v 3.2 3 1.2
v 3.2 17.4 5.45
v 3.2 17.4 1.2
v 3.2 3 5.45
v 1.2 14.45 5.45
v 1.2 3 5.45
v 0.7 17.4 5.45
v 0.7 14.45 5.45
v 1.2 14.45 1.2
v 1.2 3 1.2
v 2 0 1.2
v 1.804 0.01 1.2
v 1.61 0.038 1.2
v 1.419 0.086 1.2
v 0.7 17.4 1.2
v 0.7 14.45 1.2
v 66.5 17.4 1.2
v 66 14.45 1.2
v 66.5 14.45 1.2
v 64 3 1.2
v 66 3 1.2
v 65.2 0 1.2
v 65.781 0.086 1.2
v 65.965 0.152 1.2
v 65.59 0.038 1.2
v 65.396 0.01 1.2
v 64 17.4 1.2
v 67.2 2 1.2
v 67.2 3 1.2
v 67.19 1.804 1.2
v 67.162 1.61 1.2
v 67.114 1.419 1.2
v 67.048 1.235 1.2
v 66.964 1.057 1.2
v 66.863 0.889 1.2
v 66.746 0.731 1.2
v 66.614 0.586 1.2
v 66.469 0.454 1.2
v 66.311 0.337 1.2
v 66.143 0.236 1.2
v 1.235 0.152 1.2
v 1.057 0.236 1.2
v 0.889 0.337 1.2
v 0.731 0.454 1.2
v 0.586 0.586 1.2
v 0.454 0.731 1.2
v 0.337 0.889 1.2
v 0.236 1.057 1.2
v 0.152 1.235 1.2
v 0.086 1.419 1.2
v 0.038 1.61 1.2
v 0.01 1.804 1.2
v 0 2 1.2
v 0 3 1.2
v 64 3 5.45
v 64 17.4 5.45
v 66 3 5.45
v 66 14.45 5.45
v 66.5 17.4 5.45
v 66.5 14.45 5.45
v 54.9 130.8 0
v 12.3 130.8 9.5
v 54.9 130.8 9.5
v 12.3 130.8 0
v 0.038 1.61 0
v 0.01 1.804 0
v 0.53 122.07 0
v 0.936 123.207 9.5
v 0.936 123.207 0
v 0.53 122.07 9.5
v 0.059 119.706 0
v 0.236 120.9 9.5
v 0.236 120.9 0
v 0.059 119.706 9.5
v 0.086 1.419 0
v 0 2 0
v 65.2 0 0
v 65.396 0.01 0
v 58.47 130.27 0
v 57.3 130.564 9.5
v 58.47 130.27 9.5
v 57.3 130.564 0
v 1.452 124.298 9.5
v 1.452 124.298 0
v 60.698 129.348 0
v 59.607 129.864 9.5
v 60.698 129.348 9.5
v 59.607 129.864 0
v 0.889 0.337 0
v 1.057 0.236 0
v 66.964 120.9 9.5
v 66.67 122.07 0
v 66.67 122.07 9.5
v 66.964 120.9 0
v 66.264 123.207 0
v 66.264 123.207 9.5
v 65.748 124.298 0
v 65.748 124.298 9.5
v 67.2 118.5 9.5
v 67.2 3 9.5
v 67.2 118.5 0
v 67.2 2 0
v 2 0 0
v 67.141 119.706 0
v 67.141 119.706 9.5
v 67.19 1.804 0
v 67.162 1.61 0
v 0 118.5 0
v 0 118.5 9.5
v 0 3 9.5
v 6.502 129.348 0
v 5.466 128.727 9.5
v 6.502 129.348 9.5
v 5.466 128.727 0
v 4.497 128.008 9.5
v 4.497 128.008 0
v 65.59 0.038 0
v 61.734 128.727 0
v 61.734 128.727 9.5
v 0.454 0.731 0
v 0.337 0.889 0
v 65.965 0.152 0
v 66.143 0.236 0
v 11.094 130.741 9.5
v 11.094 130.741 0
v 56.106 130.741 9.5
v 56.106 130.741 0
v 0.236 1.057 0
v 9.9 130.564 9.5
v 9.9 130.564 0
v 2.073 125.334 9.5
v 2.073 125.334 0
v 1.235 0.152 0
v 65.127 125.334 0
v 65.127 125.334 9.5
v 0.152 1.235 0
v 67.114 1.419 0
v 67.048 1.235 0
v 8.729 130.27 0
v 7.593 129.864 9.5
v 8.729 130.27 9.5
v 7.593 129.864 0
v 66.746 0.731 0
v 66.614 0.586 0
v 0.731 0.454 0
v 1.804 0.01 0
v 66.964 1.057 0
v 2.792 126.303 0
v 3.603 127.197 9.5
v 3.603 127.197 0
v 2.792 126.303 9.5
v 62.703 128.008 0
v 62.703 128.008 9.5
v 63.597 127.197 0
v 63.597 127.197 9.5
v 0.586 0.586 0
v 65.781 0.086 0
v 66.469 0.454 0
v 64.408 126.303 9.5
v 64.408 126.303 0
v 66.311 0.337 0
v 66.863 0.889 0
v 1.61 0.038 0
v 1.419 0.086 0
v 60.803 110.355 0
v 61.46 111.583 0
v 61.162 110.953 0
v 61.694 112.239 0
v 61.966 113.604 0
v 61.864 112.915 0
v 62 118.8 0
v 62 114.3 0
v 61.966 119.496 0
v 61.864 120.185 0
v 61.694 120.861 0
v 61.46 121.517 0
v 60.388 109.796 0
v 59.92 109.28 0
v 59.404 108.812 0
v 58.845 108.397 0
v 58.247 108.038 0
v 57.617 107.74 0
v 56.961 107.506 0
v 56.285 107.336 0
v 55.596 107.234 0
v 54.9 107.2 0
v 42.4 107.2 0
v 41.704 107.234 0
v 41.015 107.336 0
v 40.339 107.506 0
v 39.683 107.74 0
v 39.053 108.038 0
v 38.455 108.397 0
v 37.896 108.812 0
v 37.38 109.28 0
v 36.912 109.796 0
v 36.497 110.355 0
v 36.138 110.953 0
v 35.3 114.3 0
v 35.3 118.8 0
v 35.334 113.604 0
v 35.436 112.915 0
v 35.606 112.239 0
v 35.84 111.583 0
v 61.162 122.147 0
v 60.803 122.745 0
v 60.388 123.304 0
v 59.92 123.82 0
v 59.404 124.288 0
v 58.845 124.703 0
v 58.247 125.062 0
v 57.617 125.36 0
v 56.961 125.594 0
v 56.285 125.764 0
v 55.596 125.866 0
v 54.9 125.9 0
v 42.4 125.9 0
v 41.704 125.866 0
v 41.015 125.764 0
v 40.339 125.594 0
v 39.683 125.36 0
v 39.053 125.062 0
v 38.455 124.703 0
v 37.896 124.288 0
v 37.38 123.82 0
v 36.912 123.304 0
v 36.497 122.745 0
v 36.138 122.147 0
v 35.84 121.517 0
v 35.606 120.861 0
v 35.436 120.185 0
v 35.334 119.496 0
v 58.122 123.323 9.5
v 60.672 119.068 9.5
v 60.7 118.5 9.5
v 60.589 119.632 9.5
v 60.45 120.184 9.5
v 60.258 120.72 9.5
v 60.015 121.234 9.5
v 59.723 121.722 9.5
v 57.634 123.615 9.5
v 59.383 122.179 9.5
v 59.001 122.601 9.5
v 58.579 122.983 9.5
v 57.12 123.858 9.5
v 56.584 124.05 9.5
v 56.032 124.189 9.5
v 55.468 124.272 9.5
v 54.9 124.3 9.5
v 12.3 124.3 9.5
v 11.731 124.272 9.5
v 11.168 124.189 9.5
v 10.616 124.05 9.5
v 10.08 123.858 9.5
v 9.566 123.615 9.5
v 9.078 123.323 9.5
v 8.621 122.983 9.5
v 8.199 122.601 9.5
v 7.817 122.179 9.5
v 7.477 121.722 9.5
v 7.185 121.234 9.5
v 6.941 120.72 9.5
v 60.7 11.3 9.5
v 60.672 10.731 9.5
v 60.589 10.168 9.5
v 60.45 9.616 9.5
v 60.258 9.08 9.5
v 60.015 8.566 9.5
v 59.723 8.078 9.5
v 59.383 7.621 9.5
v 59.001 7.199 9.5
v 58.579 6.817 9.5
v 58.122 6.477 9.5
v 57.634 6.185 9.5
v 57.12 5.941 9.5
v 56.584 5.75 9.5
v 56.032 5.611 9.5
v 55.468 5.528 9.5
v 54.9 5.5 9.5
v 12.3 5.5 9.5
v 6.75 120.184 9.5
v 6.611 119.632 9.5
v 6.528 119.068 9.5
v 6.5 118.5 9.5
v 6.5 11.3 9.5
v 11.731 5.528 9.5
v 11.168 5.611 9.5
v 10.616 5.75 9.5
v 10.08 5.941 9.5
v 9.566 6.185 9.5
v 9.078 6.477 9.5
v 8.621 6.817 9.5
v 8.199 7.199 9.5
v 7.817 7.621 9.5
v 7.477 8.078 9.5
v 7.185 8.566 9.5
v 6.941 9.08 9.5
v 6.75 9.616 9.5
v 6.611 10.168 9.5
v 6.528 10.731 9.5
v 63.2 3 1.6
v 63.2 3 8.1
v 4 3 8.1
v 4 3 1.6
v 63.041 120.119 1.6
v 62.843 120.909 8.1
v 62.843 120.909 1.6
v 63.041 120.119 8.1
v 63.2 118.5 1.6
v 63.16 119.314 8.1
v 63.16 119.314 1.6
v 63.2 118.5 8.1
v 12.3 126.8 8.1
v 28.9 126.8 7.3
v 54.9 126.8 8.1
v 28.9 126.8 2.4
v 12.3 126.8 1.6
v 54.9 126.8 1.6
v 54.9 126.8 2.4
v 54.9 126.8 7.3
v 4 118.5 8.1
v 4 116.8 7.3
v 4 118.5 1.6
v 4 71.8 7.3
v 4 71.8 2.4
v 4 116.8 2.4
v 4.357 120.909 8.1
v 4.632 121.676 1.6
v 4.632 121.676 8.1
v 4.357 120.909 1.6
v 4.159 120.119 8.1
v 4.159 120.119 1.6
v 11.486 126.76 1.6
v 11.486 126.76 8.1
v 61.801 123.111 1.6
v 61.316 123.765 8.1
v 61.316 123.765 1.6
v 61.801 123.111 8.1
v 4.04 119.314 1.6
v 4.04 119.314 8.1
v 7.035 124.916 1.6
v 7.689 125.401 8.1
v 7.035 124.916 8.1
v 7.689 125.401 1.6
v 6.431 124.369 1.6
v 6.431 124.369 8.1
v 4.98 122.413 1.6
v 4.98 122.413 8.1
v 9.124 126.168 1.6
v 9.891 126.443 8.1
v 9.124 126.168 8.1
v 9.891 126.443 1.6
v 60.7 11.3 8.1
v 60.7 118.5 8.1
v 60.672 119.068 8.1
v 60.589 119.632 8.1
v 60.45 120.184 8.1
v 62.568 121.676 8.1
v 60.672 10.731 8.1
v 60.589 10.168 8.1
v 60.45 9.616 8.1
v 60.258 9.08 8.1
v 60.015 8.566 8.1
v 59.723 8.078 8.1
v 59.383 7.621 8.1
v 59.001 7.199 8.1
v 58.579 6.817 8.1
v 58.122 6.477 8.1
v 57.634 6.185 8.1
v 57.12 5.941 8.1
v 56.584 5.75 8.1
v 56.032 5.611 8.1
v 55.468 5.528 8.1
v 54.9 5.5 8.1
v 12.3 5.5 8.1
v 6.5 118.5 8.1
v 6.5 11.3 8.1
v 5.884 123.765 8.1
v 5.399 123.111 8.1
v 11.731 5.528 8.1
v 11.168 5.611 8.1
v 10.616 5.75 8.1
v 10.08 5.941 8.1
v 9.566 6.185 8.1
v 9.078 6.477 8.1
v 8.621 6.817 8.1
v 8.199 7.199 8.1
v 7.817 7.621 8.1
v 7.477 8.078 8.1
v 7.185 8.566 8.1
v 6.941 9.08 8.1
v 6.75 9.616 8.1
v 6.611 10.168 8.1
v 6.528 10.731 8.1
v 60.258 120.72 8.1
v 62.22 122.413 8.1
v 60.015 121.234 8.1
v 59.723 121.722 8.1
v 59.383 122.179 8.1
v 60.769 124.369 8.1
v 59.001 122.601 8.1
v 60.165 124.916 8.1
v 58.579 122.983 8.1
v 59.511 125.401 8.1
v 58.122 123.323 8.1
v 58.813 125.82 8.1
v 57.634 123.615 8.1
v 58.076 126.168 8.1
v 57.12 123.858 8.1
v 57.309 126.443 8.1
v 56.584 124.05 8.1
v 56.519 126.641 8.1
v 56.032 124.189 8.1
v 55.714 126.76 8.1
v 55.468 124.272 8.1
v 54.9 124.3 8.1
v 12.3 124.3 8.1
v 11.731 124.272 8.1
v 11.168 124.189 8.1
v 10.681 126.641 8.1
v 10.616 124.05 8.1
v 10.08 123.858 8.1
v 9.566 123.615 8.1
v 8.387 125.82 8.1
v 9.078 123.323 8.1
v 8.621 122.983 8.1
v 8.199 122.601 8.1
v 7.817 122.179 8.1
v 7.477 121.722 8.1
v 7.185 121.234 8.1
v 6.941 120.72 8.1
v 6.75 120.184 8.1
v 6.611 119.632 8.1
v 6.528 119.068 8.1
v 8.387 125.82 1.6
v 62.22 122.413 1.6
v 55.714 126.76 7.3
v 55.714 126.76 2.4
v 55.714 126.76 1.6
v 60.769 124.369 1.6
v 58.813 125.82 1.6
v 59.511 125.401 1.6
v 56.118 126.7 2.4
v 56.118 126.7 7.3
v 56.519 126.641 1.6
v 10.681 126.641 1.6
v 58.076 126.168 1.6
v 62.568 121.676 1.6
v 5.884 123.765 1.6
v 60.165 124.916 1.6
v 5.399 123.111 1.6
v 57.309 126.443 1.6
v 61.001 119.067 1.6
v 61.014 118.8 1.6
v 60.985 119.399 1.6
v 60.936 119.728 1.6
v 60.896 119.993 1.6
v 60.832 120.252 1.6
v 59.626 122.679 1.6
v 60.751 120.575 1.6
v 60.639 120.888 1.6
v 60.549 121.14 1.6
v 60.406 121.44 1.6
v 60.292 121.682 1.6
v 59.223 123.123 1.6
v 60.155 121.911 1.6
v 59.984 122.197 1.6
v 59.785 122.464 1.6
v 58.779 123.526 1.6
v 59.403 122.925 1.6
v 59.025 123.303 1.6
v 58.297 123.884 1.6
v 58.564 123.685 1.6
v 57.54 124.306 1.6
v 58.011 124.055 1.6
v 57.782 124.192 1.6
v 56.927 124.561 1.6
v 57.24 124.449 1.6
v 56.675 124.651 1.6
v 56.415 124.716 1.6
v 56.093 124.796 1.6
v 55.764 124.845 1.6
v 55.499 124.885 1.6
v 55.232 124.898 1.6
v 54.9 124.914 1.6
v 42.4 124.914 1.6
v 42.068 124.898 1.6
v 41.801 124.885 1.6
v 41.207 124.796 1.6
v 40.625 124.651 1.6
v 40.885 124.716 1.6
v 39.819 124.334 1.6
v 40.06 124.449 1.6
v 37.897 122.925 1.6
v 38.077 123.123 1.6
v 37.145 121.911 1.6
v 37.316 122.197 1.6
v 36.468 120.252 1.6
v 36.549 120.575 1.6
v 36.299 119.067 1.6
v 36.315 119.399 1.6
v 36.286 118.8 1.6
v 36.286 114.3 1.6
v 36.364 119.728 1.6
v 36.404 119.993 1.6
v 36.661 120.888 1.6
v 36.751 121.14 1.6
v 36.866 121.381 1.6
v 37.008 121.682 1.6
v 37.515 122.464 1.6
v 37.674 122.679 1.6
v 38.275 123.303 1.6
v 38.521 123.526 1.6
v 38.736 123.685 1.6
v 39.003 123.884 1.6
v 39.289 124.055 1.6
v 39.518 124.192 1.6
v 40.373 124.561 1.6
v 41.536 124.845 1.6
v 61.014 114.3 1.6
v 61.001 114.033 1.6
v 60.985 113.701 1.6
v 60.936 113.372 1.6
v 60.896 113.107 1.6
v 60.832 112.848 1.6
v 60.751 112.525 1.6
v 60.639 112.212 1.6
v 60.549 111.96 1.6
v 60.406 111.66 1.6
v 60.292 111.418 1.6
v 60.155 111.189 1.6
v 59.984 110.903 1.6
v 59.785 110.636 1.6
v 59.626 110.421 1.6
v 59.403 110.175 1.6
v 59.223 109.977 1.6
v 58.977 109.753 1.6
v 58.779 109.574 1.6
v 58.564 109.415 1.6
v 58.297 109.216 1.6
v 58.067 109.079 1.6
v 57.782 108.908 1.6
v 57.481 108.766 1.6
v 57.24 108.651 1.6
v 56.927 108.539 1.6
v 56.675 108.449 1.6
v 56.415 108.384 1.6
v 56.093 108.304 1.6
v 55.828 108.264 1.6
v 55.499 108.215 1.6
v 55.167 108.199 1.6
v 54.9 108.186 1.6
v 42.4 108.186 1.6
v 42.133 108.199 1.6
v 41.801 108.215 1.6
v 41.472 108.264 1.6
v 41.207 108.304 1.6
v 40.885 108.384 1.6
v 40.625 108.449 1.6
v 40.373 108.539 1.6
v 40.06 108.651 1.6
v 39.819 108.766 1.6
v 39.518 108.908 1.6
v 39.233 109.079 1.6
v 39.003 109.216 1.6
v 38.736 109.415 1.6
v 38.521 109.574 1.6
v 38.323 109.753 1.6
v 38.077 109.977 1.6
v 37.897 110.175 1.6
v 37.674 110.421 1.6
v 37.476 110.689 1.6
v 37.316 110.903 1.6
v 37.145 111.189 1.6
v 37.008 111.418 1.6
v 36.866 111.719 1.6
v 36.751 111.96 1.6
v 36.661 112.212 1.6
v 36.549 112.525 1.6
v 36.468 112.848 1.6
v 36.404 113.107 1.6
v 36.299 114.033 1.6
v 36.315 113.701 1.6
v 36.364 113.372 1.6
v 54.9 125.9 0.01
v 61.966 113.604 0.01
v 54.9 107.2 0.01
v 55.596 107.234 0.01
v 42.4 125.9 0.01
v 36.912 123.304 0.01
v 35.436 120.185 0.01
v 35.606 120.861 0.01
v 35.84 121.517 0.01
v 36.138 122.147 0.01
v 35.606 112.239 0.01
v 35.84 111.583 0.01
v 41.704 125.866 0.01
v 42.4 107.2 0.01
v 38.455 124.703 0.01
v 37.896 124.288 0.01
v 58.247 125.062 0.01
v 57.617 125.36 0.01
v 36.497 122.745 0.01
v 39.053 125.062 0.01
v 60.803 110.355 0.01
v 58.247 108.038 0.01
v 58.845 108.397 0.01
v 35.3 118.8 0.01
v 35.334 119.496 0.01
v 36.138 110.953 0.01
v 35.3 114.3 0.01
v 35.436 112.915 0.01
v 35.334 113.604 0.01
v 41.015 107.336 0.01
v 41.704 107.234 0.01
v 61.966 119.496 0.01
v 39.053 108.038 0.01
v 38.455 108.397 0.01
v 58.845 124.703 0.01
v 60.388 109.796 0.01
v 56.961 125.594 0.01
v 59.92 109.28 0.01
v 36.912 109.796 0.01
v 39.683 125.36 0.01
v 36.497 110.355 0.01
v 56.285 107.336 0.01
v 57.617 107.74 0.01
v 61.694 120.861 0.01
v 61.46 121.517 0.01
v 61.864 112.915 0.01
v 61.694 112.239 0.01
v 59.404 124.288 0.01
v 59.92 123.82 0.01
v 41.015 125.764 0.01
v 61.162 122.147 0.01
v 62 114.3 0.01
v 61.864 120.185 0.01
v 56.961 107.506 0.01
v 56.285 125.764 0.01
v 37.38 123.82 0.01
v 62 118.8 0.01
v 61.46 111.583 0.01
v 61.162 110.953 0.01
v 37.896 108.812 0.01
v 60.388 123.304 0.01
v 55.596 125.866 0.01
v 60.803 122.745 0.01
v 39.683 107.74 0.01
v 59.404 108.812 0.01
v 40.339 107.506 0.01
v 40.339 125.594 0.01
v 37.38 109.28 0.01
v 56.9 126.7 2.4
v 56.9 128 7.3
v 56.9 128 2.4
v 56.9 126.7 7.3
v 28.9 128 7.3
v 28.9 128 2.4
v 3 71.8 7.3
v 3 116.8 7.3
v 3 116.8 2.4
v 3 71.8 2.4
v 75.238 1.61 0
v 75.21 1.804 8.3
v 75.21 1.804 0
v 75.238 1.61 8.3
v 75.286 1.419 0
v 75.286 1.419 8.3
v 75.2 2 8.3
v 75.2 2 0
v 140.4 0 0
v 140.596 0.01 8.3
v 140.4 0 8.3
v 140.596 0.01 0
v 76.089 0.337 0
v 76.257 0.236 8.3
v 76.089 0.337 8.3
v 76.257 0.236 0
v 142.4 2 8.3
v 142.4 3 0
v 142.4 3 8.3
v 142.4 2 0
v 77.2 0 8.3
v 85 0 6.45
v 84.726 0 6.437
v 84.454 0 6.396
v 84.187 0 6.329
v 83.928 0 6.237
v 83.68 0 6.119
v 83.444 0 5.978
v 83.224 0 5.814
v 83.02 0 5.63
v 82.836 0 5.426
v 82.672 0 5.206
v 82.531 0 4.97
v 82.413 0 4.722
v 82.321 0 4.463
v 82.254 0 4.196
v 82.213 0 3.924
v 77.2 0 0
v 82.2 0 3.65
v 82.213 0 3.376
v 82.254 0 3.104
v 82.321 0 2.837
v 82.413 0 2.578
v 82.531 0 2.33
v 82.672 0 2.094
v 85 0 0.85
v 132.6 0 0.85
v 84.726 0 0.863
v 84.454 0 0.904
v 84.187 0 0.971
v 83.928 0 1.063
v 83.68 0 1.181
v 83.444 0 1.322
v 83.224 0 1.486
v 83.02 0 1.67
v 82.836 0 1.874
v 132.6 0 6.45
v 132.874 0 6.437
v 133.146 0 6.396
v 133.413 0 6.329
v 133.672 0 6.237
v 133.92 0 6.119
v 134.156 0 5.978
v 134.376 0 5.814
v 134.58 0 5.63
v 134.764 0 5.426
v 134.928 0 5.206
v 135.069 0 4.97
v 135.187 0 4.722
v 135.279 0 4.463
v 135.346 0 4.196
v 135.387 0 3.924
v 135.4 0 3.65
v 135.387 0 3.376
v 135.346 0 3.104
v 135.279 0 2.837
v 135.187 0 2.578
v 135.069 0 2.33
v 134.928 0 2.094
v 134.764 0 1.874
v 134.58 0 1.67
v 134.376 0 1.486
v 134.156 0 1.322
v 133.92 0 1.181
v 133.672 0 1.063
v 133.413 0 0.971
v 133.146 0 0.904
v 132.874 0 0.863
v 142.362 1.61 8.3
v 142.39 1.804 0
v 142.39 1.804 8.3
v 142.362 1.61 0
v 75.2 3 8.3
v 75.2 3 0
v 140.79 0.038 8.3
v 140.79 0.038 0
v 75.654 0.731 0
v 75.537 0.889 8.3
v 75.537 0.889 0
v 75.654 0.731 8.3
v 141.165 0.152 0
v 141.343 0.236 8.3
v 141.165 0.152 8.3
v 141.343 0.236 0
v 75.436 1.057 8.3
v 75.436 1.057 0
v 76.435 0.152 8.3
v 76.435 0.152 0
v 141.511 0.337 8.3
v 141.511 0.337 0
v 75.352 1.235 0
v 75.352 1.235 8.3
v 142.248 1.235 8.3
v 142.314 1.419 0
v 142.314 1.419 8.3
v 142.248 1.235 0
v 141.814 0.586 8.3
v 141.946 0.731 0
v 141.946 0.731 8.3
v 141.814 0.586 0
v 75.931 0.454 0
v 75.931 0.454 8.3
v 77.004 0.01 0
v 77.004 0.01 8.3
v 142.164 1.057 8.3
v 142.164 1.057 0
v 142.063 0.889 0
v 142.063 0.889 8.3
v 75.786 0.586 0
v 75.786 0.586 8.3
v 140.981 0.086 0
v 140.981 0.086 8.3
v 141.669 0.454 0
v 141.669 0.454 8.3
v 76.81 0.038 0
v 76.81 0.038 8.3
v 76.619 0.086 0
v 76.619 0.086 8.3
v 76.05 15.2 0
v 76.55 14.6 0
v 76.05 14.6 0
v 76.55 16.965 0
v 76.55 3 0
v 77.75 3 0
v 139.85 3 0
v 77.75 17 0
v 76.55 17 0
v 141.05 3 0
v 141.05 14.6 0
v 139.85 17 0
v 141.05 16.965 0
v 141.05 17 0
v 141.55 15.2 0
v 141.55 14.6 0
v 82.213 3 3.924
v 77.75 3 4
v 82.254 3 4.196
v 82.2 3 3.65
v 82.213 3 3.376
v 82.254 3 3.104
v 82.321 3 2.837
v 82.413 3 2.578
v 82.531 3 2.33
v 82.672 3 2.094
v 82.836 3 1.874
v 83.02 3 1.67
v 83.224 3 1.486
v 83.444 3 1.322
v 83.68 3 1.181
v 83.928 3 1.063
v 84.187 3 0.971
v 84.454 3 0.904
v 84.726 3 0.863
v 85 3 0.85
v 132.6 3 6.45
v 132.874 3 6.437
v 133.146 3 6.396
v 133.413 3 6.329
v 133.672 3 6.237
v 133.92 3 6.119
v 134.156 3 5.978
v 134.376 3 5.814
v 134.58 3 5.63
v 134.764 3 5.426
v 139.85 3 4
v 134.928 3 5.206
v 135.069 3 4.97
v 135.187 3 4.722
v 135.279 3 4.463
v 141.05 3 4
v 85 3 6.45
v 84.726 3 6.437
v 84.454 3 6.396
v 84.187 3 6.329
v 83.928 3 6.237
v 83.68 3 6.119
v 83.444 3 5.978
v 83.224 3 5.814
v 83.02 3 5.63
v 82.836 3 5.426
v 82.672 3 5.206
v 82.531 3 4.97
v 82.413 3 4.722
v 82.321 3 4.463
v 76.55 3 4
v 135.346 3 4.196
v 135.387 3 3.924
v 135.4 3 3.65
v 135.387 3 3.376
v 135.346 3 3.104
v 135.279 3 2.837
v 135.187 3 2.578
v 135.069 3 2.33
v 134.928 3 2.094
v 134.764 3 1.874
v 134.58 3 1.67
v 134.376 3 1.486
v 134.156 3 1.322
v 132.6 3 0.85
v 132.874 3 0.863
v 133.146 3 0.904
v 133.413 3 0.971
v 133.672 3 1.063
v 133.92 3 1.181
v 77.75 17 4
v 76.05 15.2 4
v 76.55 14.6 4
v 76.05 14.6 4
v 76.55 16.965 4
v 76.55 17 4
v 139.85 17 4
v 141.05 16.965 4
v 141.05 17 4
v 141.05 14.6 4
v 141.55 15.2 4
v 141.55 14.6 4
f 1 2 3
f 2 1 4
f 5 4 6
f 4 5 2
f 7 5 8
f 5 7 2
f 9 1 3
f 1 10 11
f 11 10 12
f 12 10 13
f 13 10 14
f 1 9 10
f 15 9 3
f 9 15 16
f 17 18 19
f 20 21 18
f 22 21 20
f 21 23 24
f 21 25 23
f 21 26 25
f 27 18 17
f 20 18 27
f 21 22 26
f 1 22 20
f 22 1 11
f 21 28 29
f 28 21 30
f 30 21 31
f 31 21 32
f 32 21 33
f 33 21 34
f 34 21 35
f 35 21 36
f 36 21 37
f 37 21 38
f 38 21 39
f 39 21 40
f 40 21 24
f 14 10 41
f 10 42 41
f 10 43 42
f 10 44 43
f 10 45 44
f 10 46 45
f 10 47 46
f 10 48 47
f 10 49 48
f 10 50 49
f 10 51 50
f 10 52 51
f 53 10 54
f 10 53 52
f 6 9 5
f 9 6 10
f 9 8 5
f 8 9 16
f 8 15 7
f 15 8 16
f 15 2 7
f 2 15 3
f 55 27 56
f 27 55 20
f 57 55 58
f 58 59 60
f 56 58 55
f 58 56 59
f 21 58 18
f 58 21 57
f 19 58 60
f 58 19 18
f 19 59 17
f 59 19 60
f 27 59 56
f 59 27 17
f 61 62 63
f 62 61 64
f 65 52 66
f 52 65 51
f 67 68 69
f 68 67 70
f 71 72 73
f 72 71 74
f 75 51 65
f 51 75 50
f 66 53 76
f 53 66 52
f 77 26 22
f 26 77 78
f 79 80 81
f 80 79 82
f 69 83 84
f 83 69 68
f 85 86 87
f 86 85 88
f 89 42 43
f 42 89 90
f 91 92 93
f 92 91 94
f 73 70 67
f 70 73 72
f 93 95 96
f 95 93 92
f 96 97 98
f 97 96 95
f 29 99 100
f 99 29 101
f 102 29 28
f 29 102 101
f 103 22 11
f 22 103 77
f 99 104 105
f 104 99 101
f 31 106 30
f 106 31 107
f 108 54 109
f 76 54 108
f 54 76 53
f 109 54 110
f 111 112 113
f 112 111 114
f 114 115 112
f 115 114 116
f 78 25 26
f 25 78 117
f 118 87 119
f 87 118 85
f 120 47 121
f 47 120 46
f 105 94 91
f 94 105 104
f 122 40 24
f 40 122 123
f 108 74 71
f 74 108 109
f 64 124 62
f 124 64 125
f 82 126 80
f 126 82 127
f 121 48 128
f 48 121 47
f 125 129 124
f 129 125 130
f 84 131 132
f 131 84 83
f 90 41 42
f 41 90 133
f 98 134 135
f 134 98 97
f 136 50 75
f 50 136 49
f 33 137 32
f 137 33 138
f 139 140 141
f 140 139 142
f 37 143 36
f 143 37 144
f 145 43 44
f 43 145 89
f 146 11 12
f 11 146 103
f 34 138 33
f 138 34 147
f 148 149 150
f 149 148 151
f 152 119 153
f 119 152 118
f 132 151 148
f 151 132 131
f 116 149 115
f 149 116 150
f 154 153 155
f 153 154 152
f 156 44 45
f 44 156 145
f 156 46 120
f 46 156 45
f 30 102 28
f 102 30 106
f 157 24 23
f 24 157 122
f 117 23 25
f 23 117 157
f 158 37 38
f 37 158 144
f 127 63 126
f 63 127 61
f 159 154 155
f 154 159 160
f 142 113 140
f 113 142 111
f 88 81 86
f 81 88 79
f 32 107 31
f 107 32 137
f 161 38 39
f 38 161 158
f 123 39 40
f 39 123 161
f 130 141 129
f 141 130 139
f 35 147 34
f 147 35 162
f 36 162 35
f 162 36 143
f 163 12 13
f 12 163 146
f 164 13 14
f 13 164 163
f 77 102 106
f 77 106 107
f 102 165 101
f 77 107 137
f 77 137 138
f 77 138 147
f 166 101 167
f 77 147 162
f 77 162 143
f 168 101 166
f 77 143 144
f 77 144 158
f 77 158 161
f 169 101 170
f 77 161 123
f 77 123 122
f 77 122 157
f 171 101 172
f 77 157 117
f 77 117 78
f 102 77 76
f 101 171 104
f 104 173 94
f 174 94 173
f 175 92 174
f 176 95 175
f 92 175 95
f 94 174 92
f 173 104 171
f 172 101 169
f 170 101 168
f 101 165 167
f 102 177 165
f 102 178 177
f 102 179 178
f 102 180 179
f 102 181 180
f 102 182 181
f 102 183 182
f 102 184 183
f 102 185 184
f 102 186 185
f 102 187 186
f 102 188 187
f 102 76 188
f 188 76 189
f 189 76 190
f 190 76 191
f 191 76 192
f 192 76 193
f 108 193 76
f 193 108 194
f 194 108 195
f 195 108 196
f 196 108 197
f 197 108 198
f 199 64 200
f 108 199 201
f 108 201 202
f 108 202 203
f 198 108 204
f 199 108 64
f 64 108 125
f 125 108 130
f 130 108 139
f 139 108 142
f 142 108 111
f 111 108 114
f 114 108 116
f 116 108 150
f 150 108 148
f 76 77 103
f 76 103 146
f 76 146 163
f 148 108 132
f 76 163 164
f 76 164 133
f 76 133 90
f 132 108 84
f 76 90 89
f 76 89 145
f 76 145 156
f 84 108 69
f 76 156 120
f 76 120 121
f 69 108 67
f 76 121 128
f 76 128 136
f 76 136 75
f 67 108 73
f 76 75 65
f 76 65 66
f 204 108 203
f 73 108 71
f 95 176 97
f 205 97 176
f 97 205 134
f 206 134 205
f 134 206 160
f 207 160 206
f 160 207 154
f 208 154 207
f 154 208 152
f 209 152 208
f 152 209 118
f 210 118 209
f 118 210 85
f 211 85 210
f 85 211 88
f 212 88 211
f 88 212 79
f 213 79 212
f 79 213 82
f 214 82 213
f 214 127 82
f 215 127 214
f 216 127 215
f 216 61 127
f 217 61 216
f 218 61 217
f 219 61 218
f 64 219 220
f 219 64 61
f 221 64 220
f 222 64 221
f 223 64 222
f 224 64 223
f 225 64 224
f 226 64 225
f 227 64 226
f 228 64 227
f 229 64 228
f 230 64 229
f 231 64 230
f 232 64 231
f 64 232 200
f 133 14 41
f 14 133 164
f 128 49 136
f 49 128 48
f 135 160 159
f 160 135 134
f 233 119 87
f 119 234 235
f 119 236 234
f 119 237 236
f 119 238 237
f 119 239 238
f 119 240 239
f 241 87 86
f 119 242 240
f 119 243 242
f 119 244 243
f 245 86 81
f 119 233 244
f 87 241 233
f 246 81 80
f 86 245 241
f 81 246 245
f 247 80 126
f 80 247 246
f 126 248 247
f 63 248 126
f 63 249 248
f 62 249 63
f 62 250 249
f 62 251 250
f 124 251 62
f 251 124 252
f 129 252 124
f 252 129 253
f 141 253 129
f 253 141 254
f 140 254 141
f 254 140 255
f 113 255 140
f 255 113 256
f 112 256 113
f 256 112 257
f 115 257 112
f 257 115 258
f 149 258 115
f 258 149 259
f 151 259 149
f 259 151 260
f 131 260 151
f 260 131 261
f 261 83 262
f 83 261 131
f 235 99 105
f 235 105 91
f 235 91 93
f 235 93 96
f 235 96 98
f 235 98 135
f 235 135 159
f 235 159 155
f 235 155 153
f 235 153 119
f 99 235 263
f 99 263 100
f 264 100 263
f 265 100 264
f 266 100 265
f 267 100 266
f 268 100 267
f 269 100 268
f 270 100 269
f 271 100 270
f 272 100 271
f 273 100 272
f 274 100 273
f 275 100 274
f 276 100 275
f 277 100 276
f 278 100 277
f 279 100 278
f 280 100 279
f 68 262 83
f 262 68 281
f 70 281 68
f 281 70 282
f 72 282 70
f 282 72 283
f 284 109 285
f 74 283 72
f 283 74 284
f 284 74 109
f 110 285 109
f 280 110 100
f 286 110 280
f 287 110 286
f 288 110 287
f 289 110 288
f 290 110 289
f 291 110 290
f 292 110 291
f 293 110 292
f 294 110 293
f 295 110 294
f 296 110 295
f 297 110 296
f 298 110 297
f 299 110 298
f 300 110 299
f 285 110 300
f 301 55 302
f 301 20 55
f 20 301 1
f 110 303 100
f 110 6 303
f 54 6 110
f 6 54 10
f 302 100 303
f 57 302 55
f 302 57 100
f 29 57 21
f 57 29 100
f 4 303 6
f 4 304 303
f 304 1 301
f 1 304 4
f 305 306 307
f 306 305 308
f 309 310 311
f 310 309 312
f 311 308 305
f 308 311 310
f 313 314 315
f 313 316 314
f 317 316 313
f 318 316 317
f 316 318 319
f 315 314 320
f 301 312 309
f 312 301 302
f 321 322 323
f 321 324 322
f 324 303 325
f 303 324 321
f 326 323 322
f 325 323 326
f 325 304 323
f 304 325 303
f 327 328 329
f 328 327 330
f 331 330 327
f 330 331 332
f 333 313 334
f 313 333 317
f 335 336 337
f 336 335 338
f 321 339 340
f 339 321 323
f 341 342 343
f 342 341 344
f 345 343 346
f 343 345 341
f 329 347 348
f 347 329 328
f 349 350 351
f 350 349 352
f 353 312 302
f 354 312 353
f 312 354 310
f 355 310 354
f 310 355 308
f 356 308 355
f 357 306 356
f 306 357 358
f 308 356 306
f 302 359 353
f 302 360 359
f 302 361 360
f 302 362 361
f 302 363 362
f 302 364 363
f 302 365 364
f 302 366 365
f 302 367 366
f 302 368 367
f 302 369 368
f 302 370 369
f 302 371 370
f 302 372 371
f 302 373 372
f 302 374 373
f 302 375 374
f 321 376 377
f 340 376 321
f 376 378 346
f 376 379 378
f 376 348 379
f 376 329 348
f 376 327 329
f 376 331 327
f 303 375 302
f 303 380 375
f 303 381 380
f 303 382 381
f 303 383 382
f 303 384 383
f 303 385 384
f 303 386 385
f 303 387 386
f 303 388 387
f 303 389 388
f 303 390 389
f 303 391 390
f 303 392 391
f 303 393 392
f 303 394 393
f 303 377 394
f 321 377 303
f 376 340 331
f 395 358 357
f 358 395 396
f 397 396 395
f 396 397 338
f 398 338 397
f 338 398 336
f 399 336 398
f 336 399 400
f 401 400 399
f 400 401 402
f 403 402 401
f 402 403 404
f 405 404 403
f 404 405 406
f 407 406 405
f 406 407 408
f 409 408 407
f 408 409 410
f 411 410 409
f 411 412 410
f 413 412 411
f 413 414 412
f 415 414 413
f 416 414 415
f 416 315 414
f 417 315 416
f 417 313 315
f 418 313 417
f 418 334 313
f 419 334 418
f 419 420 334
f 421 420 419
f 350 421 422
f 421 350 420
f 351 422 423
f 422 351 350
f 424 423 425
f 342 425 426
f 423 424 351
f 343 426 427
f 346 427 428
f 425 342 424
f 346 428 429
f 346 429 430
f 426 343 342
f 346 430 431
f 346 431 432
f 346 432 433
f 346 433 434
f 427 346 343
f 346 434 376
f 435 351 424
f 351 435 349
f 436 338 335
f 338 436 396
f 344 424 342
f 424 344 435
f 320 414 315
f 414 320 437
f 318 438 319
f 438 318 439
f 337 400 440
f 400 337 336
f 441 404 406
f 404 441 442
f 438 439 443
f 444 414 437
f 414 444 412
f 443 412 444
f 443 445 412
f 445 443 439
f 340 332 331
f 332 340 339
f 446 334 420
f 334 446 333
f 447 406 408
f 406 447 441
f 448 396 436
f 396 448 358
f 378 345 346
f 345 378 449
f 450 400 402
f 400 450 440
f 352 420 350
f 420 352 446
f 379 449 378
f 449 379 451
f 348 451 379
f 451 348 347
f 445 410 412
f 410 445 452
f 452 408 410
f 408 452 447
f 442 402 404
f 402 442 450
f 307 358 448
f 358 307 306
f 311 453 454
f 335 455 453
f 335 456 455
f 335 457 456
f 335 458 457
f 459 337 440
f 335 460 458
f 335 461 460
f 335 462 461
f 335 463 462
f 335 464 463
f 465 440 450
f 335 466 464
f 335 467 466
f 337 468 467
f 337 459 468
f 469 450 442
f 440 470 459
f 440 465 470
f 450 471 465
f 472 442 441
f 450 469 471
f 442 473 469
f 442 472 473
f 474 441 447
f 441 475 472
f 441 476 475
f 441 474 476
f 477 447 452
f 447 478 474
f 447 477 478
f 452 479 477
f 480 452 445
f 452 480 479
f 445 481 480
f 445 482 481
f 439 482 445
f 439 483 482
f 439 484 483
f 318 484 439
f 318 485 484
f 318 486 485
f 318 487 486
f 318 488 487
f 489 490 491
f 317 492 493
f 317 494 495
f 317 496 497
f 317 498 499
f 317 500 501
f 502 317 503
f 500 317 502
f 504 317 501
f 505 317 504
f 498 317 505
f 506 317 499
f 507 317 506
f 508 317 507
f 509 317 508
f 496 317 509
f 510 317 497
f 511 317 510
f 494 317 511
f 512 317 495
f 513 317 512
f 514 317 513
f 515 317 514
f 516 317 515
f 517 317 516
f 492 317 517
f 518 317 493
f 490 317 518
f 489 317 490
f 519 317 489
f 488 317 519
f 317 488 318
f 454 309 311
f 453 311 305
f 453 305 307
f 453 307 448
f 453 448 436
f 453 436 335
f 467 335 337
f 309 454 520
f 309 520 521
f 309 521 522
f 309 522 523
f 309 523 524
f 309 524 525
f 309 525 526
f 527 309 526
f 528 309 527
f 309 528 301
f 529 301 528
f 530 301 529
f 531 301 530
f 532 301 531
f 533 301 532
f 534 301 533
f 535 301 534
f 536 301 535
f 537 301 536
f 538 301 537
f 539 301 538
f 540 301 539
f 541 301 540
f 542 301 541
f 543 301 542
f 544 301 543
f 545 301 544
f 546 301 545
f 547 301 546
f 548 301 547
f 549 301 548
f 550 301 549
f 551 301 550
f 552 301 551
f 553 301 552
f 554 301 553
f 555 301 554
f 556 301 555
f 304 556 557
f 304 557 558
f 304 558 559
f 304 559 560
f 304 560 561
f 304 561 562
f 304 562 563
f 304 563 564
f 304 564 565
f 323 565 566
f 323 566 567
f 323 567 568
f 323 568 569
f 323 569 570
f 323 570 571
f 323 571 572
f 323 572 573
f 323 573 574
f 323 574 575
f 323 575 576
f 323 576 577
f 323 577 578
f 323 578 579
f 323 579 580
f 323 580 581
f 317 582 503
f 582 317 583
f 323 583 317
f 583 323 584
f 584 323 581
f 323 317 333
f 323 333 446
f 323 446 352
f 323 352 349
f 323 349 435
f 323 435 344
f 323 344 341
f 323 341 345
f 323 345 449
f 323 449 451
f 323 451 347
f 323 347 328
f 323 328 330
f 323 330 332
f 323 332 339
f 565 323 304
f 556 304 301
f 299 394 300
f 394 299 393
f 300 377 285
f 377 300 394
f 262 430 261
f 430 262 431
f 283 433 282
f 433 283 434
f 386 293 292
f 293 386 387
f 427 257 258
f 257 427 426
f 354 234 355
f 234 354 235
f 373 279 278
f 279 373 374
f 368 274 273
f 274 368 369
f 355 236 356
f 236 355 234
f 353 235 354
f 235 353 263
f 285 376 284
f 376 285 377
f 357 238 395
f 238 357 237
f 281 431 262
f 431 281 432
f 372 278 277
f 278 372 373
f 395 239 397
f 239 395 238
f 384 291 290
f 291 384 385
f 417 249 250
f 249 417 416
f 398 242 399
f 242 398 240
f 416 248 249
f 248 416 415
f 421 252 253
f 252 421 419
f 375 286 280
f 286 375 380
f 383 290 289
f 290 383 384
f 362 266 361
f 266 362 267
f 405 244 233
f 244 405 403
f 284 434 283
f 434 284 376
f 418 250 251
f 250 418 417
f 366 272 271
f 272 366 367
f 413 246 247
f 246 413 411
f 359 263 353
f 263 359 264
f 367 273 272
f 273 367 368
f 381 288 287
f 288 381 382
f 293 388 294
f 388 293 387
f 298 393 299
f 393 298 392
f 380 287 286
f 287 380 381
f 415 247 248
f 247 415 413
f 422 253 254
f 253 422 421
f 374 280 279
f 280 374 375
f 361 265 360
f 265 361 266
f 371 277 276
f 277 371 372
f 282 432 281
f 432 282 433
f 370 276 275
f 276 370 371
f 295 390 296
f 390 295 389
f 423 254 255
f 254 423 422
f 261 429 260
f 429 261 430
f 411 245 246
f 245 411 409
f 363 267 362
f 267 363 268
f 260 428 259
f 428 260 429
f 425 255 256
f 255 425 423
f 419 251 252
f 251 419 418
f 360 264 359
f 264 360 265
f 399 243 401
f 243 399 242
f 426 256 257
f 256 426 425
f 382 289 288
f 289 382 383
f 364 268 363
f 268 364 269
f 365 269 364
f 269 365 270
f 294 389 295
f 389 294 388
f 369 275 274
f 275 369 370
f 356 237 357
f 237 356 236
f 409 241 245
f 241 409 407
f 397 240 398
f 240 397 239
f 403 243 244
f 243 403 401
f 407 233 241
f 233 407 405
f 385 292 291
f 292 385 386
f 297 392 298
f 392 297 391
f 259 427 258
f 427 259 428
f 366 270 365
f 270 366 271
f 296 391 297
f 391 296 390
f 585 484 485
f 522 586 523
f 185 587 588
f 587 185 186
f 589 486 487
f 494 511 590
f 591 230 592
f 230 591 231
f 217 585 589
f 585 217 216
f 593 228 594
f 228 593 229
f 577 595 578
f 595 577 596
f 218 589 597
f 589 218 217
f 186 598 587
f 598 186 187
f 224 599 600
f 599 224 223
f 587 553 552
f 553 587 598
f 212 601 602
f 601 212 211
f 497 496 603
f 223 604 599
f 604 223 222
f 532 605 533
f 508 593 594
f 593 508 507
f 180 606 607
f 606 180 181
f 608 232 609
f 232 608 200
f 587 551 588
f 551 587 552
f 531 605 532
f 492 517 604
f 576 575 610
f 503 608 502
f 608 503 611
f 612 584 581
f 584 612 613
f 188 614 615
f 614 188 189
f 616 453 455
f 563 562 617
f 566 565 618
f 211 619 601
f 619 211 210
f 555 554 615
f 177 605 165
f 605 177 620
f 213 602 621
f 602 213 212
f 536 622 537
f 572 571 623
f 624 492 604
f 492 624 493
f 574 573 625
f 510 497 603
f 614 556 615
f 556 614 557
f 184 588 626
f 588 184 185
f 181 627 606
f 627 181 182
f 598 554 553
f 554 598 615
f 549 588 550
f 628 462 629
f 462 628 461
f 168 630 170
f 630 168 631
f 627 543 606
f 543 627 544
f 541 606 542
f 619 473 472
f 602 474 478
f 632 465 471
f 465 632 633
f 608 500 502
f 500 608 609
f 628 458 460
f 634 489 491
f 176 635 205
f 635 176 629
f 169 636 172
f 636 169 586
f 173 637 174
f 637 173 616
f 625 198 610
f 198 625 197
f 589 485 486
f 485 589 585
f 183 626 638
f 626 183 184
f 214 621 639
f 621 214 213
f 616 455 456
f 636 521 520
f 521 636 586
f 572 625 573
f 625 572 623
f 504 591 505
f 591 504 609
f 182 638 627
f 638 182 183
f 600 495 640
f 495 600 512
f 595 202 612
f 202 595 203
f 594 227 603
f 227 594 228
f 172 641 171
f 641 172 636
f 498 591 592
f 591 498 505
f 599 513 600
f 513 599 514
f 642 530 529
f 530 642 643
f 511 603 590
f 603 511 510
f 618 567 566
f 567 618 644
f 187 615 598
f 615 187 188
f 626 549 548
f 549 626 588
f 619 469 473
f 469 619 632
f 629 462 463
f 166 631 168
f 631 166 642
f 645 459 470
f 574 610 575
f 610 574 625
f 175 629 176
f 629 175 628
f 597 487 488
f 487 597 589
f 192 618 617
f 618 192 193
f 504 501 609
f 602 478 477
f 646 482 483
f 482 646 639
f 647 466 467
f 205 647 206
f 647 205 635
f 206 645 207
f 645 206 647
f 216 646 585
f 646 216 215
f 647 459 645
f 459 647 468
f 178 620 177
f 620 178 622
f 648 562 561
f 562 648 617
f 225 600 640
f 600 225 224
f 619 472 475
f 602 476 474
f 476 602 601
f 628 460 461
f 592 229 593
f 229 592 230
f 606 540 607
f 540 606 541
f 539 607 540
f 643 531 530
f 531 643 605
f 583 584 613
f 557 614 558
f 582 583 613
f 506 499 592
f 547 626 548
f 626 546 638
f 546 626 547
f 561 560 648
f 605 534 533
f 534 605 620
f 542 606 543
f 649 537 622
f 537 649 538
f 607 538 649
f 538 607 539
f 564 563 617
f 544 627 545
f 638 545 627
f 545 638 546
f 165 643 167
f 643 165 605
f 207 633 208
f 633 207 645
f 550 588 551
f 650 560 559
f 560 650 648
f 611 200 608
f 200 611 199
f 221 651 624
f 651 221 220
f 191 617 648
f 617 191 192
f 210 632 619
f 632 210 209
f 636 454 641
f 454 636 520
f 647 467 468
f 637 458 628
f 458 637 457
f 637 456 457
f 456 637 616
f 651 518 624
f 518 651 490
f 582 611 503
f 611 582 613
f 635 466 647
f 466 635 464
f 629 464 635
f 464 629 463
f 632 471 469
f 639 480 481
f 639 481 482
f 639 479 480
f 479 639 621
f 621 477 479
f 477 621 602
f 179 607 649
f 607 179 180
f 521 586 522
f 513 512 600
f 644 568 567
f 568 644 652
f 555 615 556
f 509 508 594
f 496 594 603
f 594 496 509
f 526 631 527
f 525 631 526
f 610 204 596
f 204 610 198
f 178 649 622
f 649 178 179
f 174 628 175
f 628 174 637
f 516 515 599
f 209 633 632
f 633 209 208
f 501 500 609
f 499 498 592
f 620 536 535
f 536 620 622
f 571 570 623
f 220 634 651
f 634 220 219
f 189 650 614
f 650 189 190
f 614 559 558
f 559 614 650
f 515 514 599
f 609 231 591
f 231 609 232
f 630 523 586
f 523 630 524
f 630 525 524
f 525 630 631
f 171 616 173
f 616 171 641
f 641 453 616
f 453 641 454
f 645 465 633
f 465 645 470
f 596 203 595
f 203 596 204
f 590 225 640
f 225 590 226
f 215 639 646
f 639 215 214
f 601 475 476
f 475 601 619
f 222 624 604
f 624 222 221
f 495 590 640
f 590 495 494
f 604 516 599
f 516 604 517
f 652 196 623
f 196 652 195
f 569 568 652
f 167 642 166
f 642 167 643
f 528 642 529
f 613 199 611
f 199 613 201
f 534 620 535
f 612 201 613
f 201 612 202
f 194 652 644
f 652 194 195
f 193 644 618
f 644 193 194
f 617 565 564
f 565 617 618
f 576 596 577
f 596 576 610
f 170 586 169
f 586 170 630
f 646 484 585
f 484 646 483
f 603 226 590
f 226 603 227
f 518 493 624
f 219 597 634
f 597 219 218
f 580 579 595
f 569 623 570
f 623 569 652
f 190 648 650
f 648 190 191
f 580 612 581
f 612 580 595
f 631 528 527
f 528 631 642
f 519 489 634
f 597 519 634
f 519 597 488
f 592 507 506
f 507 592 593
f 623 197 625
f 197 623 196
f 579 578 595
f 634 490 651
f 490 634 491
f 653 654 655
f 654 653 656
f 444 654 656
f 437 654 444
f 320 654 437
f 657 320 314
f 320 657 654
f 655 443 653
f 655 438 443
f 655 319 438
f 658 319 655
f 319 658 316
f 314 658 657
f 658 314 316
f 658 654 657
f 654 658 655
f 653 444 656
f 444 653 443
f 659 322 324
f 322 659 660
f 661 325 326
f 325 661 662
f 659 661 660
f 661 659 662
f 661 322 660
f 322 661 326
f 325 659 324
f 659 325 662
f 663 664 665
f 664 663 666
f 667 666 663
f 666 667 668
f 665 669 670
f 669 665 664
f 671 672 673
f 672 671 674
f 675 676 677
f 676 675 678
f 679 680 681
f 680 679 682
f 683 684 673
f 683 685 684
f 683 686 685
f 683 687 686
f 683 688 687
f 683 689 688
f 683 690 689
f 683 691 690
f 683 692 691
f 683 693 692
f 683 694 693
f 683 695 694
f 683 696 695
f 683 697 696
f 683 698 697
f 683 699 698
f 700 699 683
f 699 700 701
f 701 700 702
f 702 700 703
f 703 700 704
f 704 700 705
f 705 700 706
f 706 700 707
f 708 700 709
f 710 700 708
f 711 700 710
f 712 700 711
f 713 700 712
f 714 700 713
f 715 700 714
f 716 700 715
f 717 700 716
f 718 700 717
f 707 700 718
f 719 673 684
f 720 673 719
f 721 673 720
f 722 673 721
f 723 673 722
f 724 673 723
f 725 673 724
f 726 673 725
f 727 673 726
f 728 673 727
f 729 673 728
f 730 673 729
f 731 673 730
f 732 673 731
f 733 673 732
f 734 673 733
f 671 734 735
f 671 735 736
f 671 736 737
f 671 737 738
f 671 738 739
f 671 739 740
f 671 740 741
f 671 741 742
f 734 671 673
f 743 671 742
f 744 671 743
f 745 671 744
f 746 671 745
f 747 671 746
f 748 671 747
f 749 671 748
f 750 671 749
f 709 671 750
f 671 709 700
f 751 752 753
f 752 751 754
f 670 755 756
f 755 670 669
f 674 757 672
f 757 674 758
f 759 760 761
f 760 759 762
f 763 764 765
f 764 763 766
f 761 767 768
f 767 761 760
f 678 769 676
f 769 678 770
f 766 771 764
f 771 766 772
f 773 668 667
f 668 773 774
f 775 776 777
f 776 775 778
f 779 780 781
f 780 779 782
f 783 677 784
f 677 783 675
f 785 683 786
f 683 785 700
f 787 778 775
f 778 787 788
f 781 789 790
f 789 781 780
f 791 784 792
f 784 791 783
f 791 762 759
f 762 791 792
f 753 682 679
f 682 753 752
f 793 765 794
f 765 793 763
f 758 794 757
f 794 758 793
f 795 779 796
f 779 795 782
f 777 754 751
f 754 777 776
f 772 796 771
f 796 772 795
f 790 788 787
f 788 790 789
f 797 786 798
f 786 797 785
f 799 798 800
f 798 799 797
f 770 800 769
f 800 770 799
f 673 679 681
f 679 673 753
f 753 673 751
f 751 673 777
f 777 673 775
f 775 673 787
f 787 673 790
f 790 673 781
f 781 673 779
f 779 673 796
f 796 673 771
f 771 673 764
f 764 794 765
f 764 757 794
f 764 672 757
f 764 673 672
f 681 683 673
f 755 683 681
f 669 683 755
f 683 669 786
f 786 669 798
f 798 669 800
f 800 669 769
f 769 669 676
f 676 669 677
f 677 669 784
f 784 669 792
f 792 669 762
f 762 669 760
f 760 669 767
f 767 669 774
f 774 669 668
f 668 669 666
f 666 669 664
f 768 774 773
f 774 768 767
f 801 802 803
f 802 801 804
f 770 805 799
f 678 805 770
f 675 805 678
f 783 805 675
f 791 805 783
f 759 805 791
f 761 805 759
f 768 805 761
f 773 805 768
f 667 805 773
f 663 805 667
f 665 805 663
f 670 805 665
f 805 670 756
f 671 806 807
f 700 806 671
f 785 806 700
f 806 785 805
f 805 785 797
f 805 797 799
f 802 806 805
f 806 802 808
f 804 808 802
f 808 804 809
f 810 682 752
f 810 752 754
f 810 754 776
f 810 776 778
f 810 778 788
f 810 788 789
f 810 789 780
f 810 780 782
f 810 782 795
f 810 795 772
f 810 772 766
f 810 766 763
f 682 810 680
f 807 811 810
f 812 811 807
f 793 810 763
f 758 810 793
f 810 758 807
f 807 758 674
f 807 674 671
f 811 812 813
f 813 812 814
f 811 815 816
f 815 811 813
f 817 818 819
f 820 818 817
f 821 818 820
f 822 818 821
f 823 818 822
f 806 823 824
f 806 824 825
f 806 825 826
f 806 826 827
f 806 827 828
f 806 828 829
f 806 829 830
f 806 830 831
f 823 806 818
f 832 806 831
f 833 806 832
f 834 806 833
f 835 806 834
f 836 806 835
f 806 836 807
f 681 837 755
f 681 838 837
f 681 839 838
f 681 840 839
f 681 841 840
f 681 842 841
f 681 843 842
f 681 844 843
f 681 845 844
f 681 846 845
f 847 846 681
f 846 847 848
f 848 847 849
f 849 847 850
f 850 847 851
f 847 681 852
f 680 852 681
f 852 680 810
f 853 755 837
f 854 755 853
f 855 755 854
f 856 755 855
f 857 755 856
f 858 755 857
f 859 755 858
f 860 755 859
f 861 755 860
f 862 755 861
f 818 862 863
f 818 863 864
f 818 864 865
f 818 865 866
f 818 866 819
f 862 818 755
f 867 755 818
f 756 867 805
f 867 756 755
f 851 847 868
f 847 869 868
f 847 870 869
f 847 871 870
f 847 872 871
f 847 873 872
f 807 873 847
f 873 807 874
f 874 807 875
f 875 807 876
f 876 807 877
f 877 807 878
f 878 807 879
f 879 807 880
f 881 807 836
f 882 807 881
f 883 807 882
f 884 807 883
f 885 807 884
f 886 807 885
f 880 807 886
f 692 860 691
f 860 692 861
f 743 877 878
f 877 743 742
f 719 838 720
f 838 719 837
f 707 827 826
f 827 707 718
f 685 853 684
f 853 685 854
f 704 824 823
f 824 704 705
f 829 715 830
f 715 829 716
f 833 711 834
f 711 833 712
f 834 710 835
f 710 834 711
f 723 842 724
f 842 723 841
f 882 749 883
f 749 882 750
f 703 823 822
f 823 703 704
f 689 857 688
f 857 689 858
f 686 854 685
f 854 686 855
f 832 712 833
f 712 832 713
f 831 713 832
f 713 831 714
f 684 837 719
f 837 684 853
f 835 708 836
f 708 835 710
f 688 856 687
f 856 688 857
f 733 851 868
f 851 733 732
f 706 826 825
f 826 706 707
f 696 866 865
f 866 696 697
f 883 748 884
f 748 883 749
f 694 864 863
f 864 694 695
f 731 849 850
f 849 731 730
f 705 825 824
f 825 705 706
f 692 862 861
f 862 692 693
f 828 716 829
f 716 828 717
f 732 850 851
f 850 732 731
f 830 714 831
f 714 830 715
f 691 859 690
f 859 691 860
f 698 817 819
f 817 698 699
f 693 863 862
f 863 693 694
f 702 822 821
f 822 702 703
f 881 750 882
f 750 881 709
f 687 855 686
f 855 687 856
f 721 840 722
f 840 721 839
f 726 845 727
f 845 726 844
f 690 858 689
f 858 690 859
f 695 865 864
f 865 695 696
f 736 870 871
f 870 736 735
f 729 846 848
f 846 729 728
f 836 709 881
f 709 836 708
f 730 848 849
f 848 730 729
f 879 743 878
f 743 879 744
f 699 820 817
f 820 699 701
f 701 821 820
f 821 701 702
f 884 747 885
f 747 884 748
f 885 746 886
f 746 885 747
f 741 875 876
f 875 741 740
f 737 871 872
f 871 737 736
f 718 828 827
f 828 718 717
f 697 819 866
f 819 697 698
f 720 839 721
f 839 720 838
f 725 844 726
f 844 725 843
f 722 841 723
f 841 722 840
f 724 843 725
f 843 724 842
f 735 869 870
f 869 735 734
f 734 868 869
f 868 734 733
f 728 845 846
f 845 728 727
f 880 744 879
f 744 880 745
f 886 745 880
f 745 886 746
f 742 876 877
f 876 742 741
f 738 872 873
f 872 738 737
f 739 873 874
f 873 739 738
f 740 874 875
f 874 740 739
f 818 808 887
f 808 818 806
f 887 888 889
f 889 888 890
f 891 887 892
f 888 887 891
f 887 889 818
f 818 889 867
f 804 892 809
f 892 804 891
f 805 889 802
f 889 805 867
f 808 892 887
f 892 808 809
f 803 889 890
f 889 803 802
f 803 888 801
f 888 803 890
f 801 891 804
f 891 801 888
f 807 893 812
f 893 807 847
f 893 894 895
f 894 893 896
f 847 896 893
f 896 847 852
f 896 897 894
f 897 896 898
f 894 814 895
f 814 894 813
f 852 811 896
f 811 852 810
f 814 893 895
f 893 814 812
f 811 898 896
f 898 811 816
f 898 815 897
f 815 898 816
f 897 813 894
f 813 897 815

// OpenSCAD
// =====================================================================
//  iPod touch 6 – "Alarmy-Lock-Case"
//  Gehäuse, das den Power-Knopf (Standby/Ein-Aus) vollständig abdeckt,
//  Kamera, Display, Home-Button und Lightning/Kopfhörer frei lässt und
//  nach dem Zusammenstecken nicht mehr zerstörungsfrei geöffnet werden kann.
//
//  Zwei Teile:
//    1) Schale  (part = "tray") – Rücken, Seiten, Oberkante, Frontrahmen
//    2) Deckel  (part = "cap")  – Unterkante mit Port-Öffnung + 2 Schnapp-
//                                  zungen, die in Kanälen INNERHALB der
//                                  Seitenwände einrasten (von außen nicht
//                                  erreichbar).
//
//  Koordinaten: x = Breite, y = Länge (y=0 Unterkante / Lightning),
//               z = Dicke (z=0 Rückseite, z=H Display-Seite).
//  Blick von vorne (aufs Display): x nach rechts, y nach oben.
// =====================================================================

part = "both";            // "tray", "cap", "both" (Druckplatte), "assembled" (Vorschau)

/* ---------- iPod touch 6 (Apple-Datenblatt) ---------- */
dev_w = 58.6;             // Breite
dev_l = 123.4;            // Höhe
dev_t = 6.1;              // Dicke
dev_r = 8.0;              // Eckenradius (ca.)

/* ---------- Toleranzen ---------- */
clr   = 0.30;             // seitliches Spiel je Seite
clr_l = 0.40;             // Spiel in der Länge (gesamt)
clr_t = 0.40;             // Spiel in der Dicke (gesamt)

/* ---------- Wandstärken ---------- */
wall  = 4.0;              // Seiten- und Oberwand (enthält die Schnappkanäle)
fl    = 1.6;              // Rückwand
lip_t = 1.4;              // Dicke Frontrahmen
lip   = 2.5;              // wie weit der Frontrahmen übers Glas greift
end_t = 3.0;              // Dicke Deckel (Unterkante)
shelf = 1.2;              // Boden-Absatz der Schale unter dem Deckel

/* ---------- Kamera (Rückseite) ----------
   Von hinten gesehen oben links = von vorne gesehen oben rechts.
   Maße = Abstand vom Geräte-Rand (rechts) bzw. von der Oberkante.     */
cam_x_from_edge = [2.5, 26];   // von .. bis (mm vom rechten Rand, Frontansicht)
cam_y_from_top  = [2.5, 18];   // von .. bis (mm von der Oberkante)
cam_r           = 5.5;
cam_chamfer     = true;        // Fase nach außen -> kein Vignettieren

/* ---------- Power-Knopf (Oberkante, rechts) ----------
   Innen eine Tasche, damit Druck aufs Case den Knopf NICHT auslöst.   */
pwr_x_from_edge = [6, 34];     // mm vom rechten Rand
pwr_depth       = 1.2;

/* ---------- Lautstärketasten (linke Seite) ----------
   Standard: abgedeckt (sonst kann man den Wecker leiser drehen).
   Innen ebenfalls eine Freitasche, damit sie nicht dauerhaft gedrückt sind. */
vol_open        = false;       // true = Öffnung statt Abdeckung
vol_y_from_top  = [10, 55];
vol_depth       = 1.0;

/* ---------- Unterkante: Lightning, Kopfhörer, Lautsprecher ---------- */
port_margin = 7.0;             // Abstand der Öffnung von der Außenkante (x)
port_h      = 5.6;             // Höhe der Öffnung (z)

/* ---------- Schnappzungen ---------- */
tng_len  = 14;            // Länge der Zunge
tng_x    = 1.2;           // Stärke (Biegerichtung)
tng_z    = 4.0;           // Höhe
hook_h   = 0.5;           // Hakenüberstand
hook_l   = 2.4;           // Hakenlänge (inkl. Rampe 1.8)
s_clr    = 0.15;          // Spiel im Kanal
ch_out   = 0.7;           // Restwand außen am Kanal

$fn = 64;

/* ---------- abgeleitete Maße ---------- */
cav_w = dev_w + 2*clr;
cav_l = dev_l + clr_l;
cav_t = dev_t + clr_t;
cav_r = dev_r + clr;
W  = cav_w + 2*wall;
L  = end_t + cav_l + wall;
H  = fl + cav_t + lip_t;
cx0 = wall;  cx1 = wall + cav_w;          // Innenraum x
cy0 = end_t; cy1 = end_t + cav_l;         // Innenraum y
cz0 = fl;    cz1 = fl + cav_t;            // Innenraum z
R_top = cav_r + wall;                     // äußerer Radius oben
R_bot = 2.0;                              // äußerer Radius unten (eckiger, damit der Einschub passt)

echo(str("Außenmaße: ", W, " x ", L, " x ", H, " mm"));

// 2D-Rechteck mit unterschiedlichen Radien unten/oben
module rr(x0, y0, x1, y1, rb, rt) {
    hull() {
        for (p = [[x0, y0, rb], [x1, y0, rb], [x0, y1, rt], [x1, y1, rt]]) {
            r = p[2];
            if (r > 0.01)
                translate([p[0] + (p[0] == x0 ? r : -r), p[1] + (p[1] == y0 ? r : -r)]) circle(r = r);
            else
                translate([p[0] - (p[0] == x0 ? 0 : 0.01), p[1] - (p[1] == y0 ? 0 : 0.01)]) square(0.01);
        }
    }
}

module outer2d() { rr(0, 0, W, L, R_bot, R_top); }

// Schnappkanal + Zunge, für die linke Seite definiert, rechts gespiegelt
x_t   = ch_out + hook_h + s_clr;      // Außenkante der Zunge (Ruhelage)
y_tip = end_t + tng_len;
y_ret = y_tip - hook_l;               // Haltefläche des Hakens

module channel_left() {
    // Einführbereich: Zunge + Platz zum Ausweichen nach innen
    translate([x_t - s_clr, end_t - 1, shelf])
        cube([tng_x + hook_h + 2*s_clr, (y_ret - 0.15) - (end_t - 1), tng_z + 0.25]);
    // Rastkammer (innenliegend, von außen unerreichbar)
    translate([ch_out, y_ret - 0.15, shelf])
        cube([x_t + tng_x + hook_h + s_clr - ch_out, y_tip + 0.4 - (y_ret - 0.15), tng_z + 0.25]);
}

module tongue_left() {
    translate([x_t, end_t - 0.01, shelf]) cube([tng_x, tng_len + 0.01, tng_z]);
    // Haken: Rampe zur Spitze, senkrechte Haltefläche
    translate([0, 0, shelf])
        linear_extrude(tng_z)
            polygon([[x_t + 0.01, y_tip], [x_t - hook_h, y_tip - 1.8],
                     [x_t - hook_h, y_ret], [x_t + 0.01, y_ret]]);
}

module both_sides() { children(); translate([W, 0, 0]) mirror([1, 0, 0]) children(); }

/* ================= SCHALE ================= */
module tray() {
    difference() {
        linear_extrude(H) outer2d();

        // Deckelbereich (über dem Boden-Absatz)
        translate([-1, -1, shelf]) cube([W + 2, end_t + 1, H]);

        // Innenraum: oben gerundet, unten gerade und offen zum Einschieben
        translate([0, 0, cz0]) linear_extrude(cav_t)
            union() {
                rr(cx0, cy0, cx1, cy1, 0, cav_r);
                translate([cx0, cy0 - 2]) square([cav_w, cav_r + 2]);
            }

        // Displayfenster
        translate([0, 0, cz1 - 0.01]) linear_extrude(lip_t + 1)
            rr(cx0 + lip, cy0 + lip, cx1 - lip, cy1 - lip, cav_r - lip, cav_r - lip);

        // Kamera
        cam_x0 = cx1 - clr - cam_x_from_edge[1];
        cam_x1 = cx1 - clr - cam_x_from_edge[0];
        cam_y0 = cy1 - cam_y_from_top[1];
        cam_y1 = cy1 - cam_y_from_top[0];
        hull() {
            translate([0, 0, fl - 0.01]) linear_extrude(1)
                rr(cam_x0, cam_y0, cam_x1, cam_y1, cam_r, cam_r);
            c = cam_chamfer ? fl : 0;
            translate([0, 0, -1]) linear_extrude(1.01)
                rr(cam_x0 - c, cam_y0 - c, cam_x1 + c, cam_y1 + c, cam_r + c, cam_r + c);
        }

        // Freitasche Power-Knopf (Oberkante) – Wand bleibt geschlossen
        translate([cx1 - clr - pwr_x_from_edge[1], cy1 - 0.1, cz0 + 0.8])
            cube([pwr_x_from_edge[1] - pwr_x_from_edge[0], pwr_depth + 0.1, cav_t - 1.6]);

        // Lautstärketasten (linke Seite, Frontansicht)
        if (vol_open)
            translate([-1, cy1 - vol_y_from_top[1], cz0 + 0.8])
                cube([wall + 2, vol_y_from_top[1] - vol_y_from_top[0], cav_t - 1.6]);
        else
            translate([cx0 - vol_depth, cy1 - vol_y_from_top[1], cz0 + 0.8])
                cube([vol_depth + 0.1, vol_y_from_top[1] - vol_y_from_top[0], cav_t - 1.6]);

        // Schnappkanäle in beiden Seitenwänden
        both_sides() channel_left();
    }
}

/* ================= DECKEL ================= */
module cap() {
    difference() {
        intersection() {
            linear_extrude(H) outer2d();
            translate([-1, -1, shelf]) cube([W + 2, end_t + 1 - 0.0, H]);
        }
        // Öffnung für Lightning, Kopfhörer und Lautsprecher
        pz = cz0 + cav_t / 2;
        hull() for (x = [port_margin + port_h/2, W - port_margin - port_h/2])
            translate([x, -1, pz]) rotate([-90, 0, 0]) cylinder(d = port_h, h = end_t + 2);
    }
    both_sides() tongue_left();
}

/* ================= Ausgabe ================= */
if (part == "tray") tray();
else if (part == "cap")
    // Druckausrichtung: Rückseite nach unten, Zungen liegen flach auf dem Bett
    translate([0, 0, -shelf]) cap();
else if (part == "assembled") {
    color("SteelBlue") tray();
    color("Orange") cap();
}
else if (part == "both") {
    tray();
    translate([W + 8, 0, -shelf]) cap();
}
